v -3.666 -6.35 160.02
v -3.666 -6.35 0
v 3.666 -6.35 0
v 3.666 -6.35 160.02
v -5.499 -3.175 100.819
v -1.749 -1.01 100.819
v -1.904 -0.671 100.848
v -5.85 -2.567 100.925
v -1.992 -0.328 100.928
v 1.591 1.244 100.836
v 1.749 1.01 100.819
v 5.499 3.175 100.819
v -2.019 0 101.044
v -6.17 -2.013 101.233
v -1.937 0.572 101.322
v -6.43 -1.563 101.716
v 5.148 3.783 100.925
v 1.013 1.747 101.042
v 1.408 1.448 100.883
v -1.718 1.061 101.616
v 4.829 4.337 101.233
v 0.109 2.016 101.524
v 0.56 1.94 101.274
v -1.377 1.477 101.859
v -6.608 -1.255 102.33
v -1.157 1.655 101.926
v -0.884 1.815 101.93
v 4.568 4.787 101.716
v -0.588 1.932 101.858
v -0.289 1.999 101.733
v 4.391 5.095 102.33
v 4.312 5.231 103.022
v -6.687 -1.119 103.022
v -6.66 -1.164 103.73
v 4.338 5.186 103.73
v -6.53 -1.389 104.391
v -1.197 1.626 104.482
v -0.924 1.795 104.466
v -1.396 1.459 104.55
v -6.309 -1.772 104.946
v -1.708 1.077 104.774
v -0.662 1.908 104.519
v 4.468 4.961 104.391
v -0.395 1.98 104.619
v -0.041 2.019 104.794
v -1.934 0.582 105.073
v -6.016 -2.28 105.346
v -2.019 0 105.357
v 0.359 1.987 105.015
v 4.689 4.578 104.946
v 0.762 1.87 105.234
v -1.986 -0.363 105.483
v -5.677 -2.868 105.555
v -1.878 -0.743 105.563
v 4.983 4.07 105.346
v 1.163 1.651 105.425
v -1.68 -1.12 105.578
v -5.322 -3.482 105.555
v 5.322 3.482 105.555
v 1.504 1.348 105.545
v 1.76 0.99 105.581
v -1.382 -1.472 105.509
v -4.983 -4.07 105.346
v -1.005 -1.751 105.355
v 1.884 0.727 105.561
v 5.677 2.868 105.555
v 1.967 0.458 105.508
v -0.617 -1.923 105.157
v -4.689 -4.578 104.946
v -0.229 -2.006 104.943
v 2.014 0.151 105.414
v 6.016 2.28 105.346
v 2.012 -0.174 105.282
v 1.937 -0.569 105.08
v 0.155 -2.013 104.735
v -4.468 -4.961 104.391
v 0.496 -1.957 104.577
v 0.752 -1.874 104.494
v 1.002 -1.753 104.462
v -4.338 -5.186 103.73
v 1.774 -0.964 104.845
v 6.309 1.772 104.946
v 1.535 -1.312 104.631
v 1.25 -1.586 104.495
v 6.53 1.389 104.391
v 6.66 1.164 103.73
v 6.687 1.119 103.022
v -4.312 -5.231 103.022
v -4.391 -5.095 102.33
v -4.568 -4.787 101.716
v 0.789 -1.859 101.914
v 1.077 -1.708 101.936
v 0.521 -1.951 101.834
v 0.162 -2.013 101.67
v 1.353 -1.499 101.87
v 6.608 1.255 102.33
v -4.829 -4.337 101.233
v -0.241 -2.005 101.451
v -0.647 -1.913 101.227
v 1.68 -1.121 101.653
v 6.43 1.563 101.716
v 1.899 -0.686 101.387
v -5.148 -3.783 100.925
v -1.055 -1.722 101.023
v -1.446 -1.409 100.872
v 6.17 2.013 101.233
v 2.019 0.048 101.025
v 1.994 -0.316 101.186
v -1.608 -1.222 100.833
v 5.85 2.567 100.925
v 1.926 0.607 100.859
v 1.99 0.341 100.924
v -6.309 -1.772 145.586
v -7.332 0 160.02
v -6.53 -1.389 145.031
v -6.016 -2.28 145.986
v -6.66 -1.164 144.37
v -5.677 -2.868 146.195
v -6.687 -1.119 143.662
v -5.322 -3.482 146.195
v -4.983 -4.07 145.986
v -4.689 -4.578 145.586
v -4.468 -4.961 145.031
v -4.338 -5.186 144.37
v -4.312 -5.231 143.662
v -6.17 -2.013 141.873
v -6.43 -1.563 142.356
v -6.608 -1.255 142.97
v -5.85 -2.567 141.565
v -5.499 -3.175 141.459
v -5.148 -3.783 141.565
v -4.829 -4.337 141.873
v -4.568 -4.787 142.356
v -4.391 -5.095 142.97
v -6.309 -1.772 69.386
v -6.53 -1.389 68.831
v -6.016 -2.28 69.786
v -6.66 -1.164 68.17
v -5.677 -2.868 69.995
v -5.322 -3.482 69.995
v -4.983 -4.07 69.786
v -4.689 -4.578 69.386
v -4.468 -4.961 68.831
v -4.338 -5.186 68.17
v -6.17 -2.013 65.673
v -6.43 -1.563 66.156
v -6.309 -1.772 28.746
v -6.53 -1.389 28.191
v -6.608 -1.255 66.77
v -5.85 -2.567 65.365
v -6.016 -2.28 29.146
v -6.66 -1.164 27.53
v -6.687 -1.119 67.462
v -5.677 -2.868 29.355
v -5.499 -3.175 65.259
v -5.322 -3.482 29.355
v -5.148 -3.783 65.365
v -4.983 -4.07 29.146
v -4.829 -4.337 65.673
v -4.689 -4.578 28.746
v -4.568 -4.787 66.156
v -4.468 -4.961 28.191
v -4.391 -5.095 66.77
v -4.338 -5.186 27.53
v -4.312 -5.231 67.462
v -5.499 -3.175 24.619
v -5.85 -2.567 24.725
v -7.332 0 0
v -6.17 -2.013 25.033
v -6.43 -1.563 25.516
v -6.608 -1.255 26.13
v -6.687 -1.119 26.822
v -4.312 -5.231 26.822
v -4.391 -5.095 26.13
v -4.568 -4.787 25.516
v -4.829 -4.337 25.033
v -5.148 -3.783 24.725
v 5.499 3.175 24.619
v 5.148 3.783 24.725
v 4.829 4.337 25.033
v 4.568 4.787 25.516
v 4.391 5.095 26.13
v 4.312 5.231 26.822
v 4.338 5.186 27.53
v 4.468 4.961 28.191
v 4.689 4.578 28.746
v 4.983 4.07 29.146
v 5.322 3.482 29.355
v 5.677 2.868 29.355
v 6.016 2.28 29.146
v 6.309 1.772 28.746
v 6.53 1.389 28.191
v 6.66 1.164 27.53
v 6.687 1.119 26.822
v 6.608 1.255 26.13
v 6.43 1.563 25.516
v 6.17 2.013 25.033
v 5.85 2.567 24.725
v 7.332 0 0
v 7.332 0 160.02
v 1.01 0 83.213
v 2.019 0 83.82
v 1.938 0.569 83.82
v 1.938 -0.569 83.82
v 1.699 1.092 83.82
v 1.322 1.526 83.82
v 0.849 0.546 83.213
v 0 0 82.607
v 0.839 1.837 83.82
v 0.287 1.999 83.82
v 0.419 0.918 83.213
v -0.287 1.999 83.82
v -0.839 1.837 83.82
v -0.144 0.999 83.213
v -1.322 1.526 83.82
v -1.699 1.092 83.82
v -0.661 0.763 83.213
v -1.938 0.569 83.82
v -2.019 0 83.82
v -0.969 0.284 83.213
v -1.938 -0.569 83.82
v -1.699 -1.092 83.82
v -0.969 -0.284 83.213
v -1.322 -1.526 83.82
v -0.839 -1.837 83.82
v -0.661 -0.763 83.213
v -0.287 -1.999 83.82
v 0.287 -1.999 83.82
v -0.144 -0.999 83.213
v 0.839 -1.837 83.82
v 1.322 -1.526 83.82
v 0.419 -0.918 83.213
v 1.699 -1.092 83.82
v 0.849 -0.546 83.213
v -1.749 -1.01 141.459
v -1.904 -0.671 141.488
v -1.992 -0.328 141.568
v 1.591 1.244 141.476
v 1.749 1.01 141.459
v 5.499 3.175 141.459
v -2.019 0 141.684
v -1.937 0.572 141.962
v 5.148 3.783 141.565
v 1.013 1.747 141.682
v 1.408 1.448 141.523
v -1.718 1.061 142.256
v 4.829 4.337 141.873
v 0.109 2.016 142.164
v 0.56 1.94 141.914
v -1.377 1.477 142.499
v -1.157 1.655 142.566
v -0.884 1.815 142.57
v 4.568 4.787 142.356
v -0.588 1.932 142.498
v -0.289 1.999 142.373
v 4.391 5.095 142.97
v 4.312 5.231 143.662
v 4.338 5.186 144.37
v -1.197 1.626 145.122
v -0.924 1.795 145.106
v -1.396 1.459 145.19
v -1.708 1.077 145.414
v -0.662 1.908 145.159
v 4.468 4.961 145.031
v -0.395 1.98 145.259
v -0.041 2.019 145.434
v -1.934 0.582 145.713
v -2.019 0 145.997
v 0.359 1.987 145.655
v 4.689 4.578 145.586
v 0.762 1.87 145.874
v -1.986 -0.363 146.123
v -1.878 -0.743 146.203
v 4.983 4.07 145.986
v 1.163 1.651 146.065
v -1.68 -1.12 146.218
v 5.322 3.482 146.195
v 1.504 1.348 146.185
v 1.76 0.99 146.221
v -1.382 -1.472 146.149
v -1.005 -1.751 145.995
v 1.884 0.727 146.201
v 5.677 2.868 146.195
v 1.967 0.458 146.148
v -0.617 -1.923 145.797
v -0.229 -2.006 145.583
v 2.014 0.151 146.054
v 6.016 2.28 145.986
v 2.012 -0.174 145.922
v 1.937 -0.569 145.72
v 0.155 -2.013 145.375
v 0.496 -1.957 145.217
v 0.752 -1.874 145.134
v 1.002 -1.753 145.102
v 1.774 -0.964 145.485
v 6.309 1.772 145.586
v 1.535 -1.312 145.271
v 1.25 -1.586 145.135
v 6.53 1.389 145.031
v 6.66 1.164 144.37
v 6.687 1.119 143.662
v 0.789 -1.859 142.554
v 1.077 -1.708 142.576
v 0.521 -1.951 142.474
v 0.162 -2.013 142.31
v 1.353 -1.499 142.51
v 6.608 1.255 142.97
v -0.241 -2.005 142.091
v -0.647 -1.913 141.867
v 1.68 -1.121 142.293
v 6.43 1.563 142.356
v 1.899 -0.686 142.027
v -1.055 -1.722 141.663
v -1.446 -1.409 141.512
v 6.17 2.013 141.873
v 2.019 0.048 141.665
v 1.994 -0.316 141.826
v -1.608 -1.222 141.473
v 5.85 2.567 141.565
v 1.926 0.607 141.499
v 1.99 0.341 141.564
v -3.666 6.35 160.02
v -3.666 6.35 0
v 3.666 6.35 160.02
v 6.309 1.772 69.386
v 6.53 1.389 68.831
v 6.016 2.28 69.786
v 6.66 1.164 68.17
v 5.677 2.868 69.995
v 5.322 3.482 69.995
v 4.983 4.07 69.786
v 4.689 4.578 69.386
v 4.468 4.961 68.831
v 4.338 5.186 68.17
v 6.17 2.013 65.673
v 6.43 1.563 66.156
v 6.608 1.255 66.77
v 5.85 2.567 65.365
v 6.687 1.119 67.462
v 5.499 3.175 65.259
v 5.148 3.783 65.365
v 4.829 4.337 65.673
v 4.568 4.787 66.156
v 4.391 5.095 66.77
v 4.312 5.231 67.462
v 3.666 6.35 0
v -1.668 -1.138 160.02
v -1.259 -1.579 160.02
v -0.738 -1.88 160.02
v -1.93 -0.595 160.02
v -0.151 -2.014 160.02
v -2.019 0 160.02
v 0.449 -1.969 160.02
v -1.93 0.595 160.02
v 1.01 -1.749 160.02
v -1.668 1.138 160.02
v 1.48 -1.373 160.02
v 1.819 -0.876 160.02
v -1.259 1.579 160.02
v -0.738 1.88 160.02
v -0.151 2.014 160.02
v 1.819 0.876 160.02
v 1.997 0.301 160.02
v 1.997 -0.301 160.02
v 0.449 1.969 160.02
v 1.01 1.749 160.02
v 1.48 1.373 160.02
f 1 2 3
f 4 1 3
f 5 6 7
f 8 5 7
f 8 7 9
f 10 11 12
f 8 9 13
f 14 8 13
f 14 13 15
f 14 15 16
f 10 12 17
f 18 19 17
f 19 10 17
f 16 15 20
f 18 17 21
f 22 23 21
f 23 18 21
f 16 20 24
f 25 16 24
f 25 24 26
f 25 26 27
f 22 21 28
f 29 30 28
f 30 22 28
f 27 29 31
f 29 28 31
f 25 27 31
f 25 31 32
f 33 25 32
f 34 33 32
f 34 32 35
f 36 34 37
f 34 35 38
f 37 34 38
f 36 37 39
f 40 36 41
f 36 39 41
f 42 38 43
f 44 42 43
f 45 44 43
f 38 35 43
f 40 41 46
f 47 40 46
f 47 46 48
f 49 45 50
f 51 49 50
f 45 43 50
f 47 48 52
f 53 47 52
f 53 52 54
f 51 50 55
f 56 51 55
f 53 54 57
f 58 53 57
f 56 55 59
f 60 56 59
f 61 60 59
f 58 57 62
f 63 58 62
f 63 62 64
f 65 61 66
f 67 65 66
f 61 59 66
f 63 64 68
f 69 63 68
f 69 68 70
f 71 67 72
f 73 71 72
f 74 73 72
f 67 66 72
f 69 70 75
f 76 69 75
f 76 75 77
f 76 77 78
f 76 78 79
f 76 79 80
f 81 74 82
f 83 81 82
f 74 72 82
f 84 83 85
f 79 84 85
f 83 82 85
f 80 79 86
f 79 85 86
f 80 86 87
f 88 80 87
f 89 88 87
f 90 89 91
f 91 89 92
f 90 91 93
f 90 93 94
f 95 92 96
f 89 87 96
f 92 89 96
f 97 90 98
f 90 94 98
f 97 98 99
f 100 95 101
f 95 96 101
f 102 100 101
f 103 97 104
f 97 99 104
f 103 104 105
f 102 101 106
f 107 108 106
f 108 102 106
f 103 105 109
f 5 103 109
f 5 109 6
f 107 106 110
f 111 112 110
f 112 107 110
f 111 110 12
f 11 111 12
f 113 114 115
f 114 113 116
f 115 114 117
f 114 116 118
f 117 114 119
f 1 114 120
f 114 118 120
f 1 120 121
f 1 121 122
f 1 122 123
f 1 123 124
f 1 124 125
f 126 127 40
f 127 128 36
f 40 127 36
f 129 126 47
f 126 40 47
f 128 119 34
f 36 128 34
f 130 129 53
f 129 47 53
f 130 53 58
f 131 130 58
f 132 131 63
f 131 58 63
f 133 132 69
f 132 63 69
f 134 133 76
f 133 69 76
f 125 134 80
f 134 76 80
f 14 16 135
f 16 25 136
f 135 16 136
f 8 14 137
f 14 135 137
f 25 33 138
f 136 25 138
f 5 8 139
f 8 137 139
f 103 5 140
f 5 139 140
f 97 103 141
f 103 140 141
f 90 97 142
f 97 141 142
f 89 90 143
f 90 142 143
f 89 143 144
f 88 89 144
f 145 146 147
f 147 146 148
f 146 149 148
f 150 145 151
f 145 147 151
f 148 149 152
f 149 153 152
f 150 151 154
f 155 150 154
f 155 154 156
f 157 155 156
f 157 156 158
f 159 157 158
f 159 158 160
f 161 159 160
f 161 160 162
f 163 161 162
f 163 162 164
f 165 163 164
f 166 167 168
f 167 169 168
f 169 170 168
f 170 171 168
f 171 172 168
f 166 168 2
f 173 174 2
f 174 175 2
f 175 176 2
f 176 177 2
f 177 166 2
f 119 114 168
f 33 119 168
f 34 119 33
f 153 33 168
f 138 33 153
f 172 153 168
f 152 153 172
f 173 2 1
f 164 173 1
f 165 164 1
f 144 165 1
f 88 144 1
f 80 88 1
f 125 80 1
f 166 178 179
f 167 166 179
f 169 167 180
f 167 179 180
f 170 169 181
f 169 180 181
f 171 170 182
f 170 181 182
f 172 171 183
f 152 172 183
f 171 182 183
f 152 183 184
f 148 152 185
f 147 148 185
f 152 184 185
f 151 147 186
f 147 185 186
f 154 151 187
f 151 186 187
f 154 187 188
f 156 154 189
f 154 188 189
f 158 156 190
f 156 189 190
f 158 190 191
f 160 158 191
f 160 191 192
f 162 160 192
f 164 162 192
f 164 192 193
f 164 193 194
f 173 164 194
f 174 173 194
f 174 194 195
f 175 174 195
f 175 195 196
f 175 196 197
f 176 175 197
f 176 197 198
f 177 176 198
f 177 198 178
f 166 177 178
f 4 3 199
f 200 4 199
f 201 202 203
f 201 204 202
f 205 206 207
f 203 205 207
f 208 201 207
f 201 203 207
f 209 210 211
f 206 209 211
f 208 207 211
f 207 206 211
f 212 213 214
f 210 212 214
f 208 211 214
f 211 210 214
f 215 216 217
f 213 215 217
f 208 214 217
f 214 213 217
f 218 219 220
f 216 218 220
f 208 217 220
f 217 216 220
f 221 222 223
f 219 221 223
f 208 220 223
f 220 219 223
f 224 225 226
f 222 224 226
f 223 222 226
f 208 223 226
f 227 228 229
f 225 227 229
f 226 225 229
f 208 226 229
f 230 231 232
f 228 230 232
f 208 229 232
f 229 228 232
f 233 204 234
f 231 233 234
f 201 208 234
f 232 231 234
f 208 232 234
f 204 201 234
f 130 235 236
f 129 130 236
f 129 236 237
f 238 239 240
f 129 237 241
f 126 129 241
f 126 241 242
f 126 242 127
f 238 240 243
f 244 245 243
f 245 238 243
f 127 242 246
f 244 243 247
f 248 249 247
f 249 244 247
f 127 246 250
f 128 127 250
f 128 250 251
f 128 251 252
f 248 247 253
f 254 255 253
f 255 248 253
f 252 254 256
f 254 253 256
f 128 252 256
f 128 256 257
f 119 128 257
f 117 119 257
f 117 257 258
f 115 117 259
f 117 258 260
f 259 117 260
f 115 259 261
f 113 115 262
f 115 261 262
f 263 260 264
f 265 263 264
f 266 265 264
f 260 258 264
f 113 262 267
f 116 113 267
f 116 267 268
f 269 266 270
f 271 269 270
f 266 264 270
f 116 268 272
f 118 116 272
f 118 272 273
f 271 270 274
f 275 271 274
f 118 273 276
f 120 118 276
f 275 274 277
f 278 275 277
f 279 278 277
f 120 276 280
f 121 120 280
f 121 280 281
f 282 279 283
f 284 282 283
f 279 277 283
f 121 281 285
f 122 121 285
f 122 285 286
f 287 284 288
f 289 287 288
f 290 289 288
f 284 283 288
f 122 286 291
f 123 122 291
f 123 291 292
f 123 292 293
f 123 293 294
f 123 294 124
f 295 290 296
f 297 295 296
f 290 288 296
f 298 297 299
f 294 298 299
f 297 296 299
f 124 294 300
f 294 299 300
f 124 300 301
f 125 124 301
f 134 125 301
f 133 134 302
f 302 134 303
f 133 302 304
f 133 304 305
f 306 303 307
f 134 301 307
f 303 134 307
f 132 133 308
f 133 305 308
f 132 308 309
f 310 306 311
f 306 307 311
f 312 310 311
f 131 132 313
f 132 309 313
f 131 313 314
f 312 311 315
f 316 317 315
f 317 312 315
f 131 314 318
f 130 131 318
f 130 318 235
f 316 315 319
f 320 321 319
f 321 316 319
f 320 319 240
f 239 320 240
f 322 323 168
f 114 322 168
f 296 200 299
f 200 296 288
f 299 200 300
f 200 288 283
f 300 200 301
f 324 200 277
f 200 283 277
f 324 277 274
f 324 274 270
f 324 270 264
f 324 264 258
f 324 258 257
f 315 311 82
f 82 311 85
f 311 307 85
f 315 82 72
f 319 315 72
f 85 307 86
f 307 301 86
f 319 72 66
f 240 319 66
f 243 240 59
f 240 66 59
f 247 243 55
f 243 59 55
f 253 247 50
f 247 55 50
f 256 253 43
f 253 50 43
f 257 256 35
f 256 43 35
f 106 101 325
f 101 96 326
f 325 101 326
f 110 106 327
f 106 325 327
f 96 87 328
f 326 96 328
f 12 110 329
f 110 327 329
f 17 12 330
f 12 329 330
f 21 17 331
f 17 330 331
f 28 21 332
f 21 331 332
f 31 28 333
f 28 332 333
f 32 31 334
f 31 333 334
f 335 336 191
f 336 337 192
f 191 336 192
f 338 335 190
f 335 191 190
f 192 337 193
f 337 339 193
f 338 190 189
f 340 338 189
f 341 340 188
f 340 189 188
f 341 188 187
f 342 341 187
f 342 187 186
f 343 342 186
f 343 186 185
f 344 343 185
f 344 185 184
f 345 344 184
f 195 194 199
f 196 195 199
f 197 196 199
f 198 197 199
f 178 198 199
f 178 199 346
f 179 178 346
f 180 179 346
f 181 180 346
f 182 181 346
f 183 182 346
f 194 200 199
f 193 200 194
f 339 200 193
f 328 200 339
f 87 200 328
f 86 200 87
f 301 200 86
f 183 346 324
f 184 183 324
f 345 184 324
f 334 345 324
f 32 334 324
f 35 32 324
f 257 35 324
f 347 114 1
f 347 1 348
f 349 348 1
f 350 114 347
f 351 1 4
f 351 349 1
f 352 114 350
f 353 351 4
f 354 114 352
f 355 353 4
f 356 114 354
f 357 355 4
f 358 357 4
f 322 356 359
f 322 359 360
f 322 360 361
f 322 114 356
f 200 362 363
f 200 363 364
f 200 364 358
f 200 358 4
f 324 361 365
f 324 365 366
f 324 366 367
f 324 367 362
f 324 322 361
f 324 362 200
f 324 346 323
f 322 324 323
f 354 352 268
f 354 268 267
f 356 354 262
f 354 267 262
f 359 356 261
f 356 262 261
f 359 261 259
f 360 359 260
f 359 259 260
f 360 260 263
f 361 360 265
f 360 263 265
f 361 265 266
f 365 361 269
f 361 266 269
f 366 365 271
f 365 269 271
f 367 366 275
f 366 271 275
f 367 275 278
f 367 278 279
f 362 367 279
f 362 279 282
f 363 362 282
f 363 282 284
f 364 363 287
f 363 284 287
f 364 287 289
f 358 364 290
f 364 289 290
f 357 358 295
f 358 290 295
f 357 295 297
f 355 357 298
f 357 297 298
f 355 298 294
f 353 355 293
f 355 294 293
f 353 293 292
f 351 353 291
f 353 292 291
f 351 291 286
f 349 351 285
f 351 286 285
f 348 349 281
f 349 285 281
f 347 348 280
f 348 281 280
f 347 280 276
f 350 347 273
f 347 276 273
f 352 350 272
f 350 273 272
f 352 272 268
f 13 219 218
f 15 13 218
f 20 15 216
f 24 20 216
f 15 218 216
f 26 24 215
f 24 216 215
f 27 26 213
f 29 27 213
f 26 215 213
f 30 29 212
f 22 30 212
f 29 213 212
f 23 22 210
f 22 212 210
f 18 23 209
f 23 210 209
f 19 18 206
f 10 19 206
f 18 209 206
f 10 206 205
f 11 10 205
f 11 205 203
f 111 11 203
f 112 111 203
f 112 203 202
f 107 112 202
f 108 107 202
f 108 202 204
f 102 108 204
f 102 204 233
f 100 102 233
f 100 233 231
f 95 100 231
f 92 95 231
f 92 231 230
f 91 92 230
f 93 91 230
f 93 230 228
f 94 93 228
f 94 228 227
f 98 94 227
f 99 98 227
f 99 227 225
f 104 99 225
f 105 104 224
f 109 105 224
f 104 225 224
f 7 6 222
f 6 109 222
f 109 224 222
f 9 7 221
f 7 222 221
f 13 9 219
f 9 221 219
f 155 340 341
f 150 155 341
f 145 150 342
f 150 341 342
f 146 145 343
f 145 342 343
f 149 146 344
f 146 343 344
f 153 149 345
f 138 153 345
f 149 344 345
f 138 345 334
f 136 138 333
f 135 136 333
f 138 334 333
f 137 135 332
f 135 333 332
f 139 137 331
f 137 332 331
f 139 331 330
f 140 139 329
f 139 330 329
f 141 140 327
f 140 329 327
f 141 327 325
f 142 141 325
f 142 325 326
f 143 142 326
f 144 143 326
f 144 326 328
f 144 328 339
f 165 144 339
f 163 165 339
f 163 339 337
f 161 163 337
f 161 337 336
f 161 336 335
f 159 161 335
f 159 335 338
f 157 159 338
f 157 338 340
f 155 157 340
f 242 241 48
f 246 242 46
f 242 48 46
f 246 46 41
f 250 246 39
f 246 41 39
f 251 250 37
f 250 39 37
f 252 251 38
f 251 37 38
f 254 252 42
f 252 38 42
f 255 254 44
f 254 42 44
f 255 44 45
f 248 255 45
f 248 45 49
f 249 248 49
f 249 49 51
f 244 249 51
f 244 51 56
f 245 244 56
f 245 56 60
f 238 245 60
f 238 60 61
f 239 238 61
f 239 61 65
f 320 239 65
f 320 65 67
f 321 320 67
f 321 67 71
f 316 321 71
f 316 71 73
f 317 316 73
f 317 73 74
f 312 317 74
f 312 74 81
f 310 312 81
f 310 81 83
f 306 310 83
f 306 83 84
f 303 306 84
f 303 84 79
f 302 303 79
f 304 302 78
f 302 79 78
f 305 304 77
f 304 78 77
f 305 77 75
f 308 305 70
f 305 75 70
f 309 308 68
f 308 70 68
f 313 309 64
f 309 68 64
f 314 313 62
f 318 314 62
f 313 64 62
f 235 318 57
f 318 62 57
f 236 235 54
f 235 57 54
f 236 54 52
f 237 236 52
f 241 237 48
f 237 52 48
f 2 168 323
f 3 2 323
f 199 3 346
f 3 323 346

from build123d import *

# Parameters (mm, degrees)
BOSS_EXTRUDE1_DEPTH        = 160.02
F_10_32_TAPPED_HOLE1_D     = 4.0386
F_10_32_TAPPED_HOLE1_DEPTH = 76.2
F_10_32_TAPPED_HOLE1_TIP   = 1.213317848
SKETCH5_R                  = 2.38125
CUT_EXTRUDE1_DEPTH         = 4.175
CUT_EXTRUDE1_DEPTH_BACK    = 16.875


with BuildPart() as part:
    # Sketch1 → Boss-Extrude1 (new body)
    with BuildSketch(Plane.XY):
        Polygon((7.332348419, 0), (3.666174209, 6.35), (-3.666174209, 6.35), (-7.332348419, 0), (-3.666174209, -6.35), (3.666174209, -6.35), align=None)
    extrude(amount=BOSS_EXTRUDE1_DEPTH)

    # #10-32 Tapped Hole1
    with Locations(Plane.XY.offset(160.02)):
        with Locations((0, 0)):
            Hole(F_10_32_TAPPED_HOLE1_D / 2, depth=F_10_32_TAPPED_HOLE1_DEPTH)
            with Locations((0, 0, -(F_10_32_TAPPED_HOLE1_DEPTH + F_10_32_TAPPED_HOLE1_TIP / 2))):  # 118° drill point
                Cone(0, F_10_32_TAPPED_HOLE1_D / 2, F_10_32_TAPPED_HOLE1_TIP, mode=Mode.SUBTRACT)

    # Sketch5 → Cut-Extrude1 (cut, two sides)
    with BuildSketch(Plane(origin=(5.499261314, 3.175, 0), x_dir=(0, 0, -1), z_dir=(0.866025404, 0.5, 0))) as cut_extrude1_sk:
        with Locations((-27.0002, 0)):
            Circle(SKETCH5_R)
        with Locations((-67.6402, 0)):
            Circle(SKETCH5_R)
        with Locations((-103.2002, 0)):
            Circle(SKETCH5_R)
        with Locations((-143.8402, 0)):
            Circle(SKETCH5_R)
    extrude(amount=CUT_EXTRUDE1_DEPTH, mode=Mode.SUBTRACT)
    extrude(cut_extrude1_sk.sketch, amount=-CUT_EXTRUDE1_DEPTH_BACK, mode=Mode.SUBTRACT)


solid = part.part
